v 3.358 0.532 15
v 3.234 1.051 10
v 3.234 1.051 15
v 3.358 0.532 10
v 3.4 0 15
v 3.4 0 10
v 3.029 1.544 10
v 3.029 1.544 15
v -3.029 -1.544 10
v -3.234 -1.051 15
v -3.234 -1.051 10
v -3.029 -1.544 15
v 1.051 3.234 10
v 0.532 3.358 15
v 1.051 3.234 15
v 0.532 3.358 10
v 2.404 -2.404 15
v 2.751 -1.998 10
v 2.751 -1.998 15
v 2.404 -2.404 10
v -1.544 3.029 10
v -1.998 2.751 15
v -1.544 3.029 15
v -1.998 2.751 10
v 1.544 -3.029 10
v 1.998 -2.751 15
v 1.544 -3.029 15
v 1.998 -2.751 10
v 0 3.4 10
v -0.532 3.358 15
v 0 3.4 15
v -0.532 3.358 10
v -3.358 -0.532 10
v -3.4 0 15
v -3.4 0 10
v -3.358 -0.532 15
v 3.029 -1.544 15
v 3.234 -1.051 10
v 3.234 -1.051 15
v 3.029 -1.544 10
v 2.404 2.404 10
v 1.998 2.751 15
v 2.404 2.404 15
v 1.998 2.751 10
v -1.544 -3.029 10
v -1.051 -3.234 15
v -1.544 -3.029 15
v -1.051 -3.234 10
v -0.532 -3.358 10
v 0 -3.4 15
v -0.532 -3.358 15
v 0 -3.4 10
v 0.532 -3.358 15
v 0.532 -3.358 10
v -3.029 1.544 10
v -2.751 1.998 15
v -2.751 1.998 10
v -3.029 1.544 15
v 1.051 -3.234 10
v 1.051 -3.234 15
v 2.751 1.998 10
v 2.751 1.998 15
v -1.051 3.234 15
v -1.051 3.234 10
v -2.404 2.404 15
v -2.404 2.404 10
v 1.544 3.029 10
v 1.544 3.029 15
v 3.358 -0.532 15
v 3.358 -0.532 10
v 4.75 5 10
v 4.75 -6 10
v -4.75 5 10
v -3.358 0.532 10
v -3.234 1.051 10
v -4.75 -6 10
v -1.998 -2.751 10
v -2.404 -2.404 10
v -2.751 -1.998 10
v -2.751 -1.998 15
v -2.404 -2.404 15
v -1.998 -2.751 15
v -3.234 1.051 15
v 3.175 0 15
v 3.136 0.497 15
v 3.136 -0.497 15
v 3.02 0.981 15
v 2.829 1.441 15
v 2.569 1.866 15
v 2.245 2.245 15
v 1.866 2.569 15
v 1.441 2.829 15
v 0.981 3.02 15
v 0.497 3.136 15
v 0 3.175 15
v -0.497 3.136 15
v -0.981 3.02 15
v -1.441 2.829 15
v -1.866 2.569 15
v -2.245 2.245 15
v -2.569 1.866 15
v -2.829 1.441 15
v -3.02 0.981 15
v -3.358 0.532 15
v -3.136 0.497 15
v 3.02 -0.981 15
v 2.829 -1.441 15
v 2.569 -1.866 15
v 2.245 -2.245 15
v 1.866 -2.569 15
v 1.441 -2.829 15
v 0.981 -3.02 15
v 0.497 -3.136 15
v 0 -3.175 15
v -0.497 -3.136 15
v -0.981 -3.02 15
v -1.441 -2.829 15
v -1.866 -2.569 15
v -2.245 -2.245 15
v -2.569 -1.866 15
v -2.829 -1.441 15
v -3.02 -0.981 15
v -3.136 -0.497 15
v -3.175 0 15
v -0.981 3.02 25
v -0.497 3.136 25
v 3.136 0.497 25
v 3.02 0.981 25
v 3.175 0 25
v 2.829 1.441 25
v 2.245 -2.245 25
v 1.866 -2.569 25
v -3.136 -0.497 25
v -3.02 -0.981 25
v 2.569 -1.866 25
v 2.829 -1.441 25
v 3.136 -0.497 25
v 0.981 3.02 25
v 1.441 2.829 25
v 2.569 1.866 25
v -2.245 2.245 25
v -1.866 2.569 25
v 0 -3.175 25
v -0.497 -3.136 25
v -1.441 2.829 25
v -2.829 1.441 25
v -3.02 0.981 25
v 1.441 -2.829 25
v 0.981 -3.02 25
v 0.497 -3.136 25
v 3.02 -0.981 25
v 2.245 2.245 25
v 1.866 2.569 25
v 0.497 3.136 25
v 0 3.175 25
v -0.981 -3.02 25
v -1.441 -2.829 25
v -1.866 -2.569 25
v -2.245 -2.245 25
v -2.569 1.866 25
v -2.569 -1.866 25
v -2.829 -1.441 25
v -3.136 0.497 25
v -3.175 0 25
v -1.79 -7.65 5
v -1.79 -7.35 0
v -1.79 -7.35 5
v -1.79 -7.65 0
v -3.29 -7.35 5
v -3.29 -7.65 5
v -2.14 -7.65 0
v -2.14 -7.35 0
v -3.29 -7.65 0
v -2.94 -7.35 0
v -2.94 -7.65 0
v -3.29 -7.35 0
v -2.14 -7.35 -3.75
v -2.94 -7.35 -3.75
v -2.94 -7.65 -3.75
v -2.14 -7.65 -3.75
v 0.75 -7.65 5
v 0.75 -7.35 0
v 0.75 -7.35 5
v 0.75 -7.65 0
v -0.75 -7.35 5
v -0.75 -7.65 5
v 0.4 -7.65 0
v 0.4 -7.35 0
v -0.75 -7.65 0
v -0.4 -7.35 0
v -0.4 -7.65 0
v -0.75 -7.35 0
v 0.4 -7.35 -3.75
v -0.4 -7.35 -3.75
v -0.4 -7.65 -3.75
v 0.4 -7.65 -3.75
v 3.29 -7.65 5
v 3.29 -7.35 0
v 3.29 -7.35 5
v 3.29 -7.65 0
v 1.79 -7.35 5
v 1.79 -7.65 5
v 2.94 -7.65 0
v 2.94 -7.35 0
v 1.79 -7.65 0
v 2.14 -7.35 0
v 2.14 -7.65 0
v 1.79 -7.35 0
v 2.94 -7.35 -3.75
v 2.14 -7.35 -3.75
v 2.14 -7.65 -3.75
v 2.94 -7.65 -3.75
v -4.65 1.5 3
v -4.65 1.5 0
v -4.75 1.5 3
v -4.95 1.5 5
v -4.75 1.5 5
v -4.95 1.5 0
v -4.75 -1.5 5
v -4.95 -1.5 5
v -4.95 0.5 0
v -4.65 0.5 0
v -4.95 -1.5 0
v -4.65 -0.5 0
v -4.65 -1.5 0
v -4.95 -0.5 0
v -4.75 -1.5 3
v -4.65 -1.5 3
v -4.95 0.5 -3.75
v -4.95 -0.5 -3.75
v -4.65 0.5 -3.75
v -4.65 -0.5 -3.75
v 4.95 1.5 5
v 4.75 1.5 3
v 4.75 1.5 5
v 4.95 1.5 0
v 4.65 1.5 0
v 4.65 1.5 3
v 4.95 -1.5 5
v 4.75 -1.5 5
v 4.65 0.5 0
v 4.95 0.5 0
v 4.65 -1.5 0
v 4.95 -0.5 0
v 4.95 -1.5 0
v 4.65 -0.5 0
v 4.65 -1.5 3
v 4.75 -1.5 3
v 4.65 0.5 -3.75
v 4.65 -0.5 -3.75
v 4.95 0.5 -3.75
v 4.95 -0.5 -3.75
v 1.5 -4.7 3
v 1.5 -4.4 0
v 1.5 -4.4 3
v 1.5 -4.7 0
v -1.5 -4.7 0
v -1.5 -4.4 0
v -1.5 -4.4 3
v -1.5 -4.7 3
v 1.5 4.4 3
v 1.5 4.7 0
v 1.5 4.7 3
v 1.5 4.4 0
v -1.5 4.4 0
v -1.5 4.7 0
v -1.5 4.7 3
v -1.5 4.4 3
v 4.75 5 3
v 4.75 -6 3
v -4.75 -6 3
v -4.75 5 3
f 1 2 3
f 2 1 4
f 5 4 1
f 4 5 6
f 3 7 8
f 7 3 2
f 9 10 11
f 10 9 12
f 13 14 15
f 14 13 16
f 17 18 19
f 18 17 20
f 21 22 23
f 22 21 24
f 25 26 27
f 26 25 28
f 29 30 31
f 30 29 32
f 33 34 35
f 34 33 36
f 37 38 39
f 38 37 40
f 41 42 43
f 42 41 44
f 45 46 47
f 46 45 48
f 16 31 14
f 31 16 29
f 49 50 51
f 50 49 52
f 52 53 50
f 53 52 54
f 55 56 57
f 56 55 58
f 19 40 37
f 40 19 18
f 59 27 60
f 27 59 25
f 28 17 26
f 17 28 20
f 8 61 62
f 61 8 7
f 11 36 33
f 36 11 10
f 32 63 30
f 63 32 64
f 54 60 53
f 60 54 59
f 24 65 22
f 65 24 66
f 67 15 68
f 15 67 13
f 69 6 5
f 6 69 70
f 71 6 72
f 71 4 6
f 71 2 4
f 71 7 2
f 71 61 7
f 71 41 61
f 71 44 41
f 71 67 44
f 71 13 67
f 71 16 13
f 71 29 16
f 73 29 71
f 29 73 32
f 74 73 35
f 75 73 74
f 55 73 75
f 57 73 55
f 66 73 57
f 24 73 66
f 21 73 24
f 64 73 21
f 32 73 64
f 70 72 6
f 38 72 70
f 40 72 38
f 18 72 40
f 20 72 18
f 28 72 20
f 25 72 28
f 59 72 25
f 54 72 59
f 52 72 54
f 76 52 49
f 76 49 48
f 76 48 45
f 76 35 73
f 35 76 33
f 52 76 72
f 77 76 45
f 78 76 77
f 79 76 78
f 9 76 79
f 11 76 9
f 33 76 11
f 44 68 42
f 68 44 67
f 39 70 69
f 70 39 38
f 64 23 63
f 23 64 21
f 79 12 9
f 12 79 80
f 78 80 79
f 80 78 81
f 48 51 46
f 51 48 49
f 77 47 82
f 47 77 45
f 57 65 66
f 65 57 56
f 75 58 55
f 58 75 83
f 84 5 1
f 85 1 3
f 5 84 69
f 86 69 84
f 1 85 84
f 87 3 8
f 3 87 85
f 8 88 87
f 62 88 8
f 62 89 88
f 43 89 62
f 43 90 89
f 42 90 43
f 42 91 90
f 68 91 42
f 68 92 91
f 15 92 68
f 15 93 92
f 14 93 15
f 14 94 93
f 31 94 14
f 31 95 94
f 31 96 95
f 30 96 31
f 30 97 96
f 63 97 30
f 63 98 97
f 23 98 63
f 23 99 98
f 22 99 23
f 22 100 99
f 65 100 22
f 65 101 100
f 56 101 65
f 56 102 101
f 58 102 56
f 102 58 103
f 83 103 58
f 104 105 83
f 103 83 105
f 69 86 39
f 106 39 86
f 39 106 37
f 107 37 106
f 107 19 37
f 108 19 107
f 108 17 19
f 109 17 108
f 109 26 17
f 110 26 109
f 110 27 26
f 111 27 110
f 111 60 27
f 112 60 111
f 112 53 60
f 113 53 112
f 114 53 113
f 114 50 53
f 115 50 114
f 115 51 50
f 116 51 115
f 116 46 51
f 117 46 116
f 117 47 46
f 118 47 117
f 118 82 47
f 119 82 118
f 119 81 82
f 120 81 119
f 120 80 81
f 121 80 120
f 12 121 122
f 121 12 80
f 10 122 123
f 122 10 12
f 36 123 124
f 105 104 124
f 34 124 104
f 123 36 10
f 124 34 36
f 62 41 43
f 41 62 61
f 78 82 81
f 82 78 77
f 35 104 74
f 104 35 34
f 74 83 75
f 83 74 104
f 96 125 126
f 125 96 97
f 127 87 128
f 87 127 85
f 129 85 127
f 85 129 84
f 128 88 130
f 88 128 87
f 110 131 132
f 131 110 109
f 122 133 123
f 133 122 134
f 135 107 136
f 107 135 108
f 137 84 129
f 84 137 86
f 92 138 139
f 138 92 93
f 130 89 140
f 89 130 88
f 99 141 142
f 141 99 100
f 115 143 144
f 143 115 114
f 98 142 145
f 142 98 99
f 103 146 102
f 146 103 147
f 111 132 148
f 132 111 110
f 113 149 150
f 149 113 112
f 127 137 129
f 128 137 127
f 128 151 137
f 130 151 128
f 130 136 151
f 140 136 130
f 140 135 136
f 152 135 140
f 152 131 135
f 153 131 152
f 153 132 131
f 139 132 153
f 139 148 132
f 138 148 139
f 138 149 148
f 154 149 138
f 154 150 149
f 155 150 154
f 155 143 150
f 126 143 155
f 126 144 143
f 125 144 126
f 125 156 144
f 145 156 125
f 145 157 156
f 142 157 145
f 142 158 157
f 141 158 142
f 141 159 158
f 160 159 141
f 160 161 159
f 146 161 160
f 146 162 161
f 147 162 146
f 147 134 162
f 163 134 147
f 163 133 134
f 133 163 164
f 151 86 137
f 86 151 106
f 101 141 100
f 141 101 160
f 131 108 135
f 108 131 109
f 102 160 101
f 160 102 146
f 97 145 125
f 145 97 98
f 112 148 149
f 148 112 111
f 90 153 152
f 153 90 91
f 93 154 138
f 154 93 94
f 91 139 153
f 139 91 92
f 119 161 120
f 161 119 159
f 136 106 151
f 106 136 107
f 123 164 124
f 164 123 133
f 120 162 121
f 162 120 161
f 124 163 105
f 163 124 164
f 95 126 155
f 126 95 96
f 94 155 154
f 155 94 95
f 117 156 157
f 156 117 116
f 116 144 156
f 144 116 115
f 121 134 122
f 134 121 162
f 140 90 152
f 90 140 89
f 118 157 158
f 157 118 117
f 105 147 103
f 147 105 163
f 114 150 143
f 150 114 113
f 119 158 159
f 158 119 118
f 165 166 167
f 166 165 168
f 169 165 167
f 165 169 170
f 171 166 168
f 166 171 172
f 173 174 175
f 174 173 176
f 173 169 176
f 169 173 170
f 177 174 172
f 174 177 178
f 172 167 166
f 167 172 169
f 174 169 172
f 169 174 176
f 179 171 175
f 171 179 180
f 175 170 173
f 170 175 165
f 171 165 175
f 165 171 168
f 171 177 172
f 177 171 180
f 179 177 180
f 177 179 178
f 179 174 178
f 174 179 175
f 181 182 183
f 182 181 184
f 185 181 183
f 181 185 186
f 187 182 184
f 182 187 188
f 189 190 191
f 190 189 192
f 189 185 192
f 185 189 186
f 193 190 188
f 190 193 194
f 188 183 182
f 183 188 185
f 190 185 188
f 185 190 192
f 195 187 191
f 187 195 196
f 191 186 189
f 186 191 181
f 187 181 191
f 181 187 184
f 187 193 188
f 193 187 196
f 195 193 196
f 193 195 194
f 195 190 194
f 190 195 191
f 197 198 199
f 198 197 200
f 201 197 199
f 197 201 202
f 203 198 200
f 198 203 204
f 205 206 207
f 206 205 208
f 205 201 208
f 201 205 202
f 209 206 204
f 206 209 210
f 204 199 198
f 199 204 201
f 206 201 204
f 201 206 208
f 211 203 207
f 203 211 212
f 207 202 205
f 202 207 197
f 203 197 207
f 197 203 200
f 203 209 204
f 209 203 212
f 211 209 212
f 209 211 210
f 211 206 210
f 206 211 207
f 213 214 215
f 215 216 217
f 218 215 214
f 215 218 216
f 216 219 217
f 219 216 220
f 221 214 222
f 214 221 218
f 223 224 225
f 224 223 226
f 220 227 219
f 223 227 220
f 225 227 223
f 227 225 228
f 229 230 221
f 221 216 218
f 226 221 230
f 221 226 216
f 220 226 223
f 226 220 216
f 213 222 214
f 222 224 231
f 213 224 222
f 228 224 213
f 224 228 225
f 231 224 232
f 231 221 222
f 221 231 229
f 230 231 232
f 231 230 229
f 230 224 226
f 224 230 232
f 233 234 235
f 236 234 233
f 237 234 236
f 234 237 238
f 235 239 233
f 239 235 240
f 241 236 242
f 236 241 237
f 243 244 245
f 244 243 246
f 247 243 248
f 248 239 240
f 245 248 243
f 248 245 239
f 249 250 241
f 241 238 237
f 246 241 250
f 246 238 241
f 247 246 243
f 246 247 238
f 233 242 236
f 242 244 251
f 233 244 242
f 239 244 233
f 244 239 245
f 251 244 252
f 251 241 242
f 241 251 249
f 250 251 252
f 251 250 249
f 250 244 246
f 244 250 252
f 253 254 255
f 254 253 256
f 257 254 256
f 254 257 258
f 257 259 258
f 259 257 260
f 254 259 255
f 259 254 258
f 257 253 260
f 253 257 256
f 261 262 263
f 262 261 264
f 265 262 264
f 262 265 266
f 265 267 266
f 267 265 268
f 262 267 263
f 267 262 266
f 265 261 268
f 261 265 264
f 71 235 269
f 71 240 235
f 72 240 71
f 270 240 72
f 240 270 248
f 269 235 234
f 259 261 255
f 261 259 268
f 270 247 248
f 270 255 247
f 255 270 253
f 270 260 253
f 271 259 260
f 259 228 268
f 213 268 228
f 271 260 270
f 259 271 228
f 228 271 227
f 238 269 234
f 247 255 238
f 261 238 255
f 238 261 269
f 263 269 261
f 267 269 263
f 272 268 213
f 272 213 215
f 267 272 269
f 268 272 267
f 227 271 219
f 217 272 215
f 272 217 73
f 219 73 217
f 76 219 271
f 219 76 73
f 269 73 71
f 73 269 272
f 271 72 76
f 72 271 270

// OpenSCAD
$fn=40;

red = [0.8,0.2,0.2];
green = [0.2,0.8,0.2];
black = [0.2,0.2,0.2];
silver = [0.75,0.75,0.75];
epsilon = 0.001;

module body()
{
    translate([0,-0.5,6.5])
	cube([9.5, 11, 7], center=true);
}

module shaft()
{
    translate([0,0,10])
	cylinder(5, d=6.8);
    translate([0,0,15])
	cylinder(10, d=6.35);
}

module leg(w1, w2)
{
    translate([0,0,2.5])
	cube([w1, 0.3, 5], center=true);

    if (w2 != 0)
	translate([0,0,0])
	    cube([w2, 0.3, 7.5], center=true);
}

module pot()
{
    color(green) body();
    color(silver) shaft();

    // Legs and supports
    color(silver) {
	translate([-2.54, -7.5]) leg(1.5, 0.8);
	translate([ 0,    -7.5]) leg(1.5, 0.8);
	translate([ 2.54, -7.5]) leg(1.5, 0.8);

	translate([-4.8, 0]) rotate(90) leg(3, 1);
	translate([ 4.8, 0]) rotate(90) leg(3, 1);

	translate([0,-4.55]) leg(3, 0);
	translate([0, 4.55]) leg(3, 0);
    }
}

pot();
